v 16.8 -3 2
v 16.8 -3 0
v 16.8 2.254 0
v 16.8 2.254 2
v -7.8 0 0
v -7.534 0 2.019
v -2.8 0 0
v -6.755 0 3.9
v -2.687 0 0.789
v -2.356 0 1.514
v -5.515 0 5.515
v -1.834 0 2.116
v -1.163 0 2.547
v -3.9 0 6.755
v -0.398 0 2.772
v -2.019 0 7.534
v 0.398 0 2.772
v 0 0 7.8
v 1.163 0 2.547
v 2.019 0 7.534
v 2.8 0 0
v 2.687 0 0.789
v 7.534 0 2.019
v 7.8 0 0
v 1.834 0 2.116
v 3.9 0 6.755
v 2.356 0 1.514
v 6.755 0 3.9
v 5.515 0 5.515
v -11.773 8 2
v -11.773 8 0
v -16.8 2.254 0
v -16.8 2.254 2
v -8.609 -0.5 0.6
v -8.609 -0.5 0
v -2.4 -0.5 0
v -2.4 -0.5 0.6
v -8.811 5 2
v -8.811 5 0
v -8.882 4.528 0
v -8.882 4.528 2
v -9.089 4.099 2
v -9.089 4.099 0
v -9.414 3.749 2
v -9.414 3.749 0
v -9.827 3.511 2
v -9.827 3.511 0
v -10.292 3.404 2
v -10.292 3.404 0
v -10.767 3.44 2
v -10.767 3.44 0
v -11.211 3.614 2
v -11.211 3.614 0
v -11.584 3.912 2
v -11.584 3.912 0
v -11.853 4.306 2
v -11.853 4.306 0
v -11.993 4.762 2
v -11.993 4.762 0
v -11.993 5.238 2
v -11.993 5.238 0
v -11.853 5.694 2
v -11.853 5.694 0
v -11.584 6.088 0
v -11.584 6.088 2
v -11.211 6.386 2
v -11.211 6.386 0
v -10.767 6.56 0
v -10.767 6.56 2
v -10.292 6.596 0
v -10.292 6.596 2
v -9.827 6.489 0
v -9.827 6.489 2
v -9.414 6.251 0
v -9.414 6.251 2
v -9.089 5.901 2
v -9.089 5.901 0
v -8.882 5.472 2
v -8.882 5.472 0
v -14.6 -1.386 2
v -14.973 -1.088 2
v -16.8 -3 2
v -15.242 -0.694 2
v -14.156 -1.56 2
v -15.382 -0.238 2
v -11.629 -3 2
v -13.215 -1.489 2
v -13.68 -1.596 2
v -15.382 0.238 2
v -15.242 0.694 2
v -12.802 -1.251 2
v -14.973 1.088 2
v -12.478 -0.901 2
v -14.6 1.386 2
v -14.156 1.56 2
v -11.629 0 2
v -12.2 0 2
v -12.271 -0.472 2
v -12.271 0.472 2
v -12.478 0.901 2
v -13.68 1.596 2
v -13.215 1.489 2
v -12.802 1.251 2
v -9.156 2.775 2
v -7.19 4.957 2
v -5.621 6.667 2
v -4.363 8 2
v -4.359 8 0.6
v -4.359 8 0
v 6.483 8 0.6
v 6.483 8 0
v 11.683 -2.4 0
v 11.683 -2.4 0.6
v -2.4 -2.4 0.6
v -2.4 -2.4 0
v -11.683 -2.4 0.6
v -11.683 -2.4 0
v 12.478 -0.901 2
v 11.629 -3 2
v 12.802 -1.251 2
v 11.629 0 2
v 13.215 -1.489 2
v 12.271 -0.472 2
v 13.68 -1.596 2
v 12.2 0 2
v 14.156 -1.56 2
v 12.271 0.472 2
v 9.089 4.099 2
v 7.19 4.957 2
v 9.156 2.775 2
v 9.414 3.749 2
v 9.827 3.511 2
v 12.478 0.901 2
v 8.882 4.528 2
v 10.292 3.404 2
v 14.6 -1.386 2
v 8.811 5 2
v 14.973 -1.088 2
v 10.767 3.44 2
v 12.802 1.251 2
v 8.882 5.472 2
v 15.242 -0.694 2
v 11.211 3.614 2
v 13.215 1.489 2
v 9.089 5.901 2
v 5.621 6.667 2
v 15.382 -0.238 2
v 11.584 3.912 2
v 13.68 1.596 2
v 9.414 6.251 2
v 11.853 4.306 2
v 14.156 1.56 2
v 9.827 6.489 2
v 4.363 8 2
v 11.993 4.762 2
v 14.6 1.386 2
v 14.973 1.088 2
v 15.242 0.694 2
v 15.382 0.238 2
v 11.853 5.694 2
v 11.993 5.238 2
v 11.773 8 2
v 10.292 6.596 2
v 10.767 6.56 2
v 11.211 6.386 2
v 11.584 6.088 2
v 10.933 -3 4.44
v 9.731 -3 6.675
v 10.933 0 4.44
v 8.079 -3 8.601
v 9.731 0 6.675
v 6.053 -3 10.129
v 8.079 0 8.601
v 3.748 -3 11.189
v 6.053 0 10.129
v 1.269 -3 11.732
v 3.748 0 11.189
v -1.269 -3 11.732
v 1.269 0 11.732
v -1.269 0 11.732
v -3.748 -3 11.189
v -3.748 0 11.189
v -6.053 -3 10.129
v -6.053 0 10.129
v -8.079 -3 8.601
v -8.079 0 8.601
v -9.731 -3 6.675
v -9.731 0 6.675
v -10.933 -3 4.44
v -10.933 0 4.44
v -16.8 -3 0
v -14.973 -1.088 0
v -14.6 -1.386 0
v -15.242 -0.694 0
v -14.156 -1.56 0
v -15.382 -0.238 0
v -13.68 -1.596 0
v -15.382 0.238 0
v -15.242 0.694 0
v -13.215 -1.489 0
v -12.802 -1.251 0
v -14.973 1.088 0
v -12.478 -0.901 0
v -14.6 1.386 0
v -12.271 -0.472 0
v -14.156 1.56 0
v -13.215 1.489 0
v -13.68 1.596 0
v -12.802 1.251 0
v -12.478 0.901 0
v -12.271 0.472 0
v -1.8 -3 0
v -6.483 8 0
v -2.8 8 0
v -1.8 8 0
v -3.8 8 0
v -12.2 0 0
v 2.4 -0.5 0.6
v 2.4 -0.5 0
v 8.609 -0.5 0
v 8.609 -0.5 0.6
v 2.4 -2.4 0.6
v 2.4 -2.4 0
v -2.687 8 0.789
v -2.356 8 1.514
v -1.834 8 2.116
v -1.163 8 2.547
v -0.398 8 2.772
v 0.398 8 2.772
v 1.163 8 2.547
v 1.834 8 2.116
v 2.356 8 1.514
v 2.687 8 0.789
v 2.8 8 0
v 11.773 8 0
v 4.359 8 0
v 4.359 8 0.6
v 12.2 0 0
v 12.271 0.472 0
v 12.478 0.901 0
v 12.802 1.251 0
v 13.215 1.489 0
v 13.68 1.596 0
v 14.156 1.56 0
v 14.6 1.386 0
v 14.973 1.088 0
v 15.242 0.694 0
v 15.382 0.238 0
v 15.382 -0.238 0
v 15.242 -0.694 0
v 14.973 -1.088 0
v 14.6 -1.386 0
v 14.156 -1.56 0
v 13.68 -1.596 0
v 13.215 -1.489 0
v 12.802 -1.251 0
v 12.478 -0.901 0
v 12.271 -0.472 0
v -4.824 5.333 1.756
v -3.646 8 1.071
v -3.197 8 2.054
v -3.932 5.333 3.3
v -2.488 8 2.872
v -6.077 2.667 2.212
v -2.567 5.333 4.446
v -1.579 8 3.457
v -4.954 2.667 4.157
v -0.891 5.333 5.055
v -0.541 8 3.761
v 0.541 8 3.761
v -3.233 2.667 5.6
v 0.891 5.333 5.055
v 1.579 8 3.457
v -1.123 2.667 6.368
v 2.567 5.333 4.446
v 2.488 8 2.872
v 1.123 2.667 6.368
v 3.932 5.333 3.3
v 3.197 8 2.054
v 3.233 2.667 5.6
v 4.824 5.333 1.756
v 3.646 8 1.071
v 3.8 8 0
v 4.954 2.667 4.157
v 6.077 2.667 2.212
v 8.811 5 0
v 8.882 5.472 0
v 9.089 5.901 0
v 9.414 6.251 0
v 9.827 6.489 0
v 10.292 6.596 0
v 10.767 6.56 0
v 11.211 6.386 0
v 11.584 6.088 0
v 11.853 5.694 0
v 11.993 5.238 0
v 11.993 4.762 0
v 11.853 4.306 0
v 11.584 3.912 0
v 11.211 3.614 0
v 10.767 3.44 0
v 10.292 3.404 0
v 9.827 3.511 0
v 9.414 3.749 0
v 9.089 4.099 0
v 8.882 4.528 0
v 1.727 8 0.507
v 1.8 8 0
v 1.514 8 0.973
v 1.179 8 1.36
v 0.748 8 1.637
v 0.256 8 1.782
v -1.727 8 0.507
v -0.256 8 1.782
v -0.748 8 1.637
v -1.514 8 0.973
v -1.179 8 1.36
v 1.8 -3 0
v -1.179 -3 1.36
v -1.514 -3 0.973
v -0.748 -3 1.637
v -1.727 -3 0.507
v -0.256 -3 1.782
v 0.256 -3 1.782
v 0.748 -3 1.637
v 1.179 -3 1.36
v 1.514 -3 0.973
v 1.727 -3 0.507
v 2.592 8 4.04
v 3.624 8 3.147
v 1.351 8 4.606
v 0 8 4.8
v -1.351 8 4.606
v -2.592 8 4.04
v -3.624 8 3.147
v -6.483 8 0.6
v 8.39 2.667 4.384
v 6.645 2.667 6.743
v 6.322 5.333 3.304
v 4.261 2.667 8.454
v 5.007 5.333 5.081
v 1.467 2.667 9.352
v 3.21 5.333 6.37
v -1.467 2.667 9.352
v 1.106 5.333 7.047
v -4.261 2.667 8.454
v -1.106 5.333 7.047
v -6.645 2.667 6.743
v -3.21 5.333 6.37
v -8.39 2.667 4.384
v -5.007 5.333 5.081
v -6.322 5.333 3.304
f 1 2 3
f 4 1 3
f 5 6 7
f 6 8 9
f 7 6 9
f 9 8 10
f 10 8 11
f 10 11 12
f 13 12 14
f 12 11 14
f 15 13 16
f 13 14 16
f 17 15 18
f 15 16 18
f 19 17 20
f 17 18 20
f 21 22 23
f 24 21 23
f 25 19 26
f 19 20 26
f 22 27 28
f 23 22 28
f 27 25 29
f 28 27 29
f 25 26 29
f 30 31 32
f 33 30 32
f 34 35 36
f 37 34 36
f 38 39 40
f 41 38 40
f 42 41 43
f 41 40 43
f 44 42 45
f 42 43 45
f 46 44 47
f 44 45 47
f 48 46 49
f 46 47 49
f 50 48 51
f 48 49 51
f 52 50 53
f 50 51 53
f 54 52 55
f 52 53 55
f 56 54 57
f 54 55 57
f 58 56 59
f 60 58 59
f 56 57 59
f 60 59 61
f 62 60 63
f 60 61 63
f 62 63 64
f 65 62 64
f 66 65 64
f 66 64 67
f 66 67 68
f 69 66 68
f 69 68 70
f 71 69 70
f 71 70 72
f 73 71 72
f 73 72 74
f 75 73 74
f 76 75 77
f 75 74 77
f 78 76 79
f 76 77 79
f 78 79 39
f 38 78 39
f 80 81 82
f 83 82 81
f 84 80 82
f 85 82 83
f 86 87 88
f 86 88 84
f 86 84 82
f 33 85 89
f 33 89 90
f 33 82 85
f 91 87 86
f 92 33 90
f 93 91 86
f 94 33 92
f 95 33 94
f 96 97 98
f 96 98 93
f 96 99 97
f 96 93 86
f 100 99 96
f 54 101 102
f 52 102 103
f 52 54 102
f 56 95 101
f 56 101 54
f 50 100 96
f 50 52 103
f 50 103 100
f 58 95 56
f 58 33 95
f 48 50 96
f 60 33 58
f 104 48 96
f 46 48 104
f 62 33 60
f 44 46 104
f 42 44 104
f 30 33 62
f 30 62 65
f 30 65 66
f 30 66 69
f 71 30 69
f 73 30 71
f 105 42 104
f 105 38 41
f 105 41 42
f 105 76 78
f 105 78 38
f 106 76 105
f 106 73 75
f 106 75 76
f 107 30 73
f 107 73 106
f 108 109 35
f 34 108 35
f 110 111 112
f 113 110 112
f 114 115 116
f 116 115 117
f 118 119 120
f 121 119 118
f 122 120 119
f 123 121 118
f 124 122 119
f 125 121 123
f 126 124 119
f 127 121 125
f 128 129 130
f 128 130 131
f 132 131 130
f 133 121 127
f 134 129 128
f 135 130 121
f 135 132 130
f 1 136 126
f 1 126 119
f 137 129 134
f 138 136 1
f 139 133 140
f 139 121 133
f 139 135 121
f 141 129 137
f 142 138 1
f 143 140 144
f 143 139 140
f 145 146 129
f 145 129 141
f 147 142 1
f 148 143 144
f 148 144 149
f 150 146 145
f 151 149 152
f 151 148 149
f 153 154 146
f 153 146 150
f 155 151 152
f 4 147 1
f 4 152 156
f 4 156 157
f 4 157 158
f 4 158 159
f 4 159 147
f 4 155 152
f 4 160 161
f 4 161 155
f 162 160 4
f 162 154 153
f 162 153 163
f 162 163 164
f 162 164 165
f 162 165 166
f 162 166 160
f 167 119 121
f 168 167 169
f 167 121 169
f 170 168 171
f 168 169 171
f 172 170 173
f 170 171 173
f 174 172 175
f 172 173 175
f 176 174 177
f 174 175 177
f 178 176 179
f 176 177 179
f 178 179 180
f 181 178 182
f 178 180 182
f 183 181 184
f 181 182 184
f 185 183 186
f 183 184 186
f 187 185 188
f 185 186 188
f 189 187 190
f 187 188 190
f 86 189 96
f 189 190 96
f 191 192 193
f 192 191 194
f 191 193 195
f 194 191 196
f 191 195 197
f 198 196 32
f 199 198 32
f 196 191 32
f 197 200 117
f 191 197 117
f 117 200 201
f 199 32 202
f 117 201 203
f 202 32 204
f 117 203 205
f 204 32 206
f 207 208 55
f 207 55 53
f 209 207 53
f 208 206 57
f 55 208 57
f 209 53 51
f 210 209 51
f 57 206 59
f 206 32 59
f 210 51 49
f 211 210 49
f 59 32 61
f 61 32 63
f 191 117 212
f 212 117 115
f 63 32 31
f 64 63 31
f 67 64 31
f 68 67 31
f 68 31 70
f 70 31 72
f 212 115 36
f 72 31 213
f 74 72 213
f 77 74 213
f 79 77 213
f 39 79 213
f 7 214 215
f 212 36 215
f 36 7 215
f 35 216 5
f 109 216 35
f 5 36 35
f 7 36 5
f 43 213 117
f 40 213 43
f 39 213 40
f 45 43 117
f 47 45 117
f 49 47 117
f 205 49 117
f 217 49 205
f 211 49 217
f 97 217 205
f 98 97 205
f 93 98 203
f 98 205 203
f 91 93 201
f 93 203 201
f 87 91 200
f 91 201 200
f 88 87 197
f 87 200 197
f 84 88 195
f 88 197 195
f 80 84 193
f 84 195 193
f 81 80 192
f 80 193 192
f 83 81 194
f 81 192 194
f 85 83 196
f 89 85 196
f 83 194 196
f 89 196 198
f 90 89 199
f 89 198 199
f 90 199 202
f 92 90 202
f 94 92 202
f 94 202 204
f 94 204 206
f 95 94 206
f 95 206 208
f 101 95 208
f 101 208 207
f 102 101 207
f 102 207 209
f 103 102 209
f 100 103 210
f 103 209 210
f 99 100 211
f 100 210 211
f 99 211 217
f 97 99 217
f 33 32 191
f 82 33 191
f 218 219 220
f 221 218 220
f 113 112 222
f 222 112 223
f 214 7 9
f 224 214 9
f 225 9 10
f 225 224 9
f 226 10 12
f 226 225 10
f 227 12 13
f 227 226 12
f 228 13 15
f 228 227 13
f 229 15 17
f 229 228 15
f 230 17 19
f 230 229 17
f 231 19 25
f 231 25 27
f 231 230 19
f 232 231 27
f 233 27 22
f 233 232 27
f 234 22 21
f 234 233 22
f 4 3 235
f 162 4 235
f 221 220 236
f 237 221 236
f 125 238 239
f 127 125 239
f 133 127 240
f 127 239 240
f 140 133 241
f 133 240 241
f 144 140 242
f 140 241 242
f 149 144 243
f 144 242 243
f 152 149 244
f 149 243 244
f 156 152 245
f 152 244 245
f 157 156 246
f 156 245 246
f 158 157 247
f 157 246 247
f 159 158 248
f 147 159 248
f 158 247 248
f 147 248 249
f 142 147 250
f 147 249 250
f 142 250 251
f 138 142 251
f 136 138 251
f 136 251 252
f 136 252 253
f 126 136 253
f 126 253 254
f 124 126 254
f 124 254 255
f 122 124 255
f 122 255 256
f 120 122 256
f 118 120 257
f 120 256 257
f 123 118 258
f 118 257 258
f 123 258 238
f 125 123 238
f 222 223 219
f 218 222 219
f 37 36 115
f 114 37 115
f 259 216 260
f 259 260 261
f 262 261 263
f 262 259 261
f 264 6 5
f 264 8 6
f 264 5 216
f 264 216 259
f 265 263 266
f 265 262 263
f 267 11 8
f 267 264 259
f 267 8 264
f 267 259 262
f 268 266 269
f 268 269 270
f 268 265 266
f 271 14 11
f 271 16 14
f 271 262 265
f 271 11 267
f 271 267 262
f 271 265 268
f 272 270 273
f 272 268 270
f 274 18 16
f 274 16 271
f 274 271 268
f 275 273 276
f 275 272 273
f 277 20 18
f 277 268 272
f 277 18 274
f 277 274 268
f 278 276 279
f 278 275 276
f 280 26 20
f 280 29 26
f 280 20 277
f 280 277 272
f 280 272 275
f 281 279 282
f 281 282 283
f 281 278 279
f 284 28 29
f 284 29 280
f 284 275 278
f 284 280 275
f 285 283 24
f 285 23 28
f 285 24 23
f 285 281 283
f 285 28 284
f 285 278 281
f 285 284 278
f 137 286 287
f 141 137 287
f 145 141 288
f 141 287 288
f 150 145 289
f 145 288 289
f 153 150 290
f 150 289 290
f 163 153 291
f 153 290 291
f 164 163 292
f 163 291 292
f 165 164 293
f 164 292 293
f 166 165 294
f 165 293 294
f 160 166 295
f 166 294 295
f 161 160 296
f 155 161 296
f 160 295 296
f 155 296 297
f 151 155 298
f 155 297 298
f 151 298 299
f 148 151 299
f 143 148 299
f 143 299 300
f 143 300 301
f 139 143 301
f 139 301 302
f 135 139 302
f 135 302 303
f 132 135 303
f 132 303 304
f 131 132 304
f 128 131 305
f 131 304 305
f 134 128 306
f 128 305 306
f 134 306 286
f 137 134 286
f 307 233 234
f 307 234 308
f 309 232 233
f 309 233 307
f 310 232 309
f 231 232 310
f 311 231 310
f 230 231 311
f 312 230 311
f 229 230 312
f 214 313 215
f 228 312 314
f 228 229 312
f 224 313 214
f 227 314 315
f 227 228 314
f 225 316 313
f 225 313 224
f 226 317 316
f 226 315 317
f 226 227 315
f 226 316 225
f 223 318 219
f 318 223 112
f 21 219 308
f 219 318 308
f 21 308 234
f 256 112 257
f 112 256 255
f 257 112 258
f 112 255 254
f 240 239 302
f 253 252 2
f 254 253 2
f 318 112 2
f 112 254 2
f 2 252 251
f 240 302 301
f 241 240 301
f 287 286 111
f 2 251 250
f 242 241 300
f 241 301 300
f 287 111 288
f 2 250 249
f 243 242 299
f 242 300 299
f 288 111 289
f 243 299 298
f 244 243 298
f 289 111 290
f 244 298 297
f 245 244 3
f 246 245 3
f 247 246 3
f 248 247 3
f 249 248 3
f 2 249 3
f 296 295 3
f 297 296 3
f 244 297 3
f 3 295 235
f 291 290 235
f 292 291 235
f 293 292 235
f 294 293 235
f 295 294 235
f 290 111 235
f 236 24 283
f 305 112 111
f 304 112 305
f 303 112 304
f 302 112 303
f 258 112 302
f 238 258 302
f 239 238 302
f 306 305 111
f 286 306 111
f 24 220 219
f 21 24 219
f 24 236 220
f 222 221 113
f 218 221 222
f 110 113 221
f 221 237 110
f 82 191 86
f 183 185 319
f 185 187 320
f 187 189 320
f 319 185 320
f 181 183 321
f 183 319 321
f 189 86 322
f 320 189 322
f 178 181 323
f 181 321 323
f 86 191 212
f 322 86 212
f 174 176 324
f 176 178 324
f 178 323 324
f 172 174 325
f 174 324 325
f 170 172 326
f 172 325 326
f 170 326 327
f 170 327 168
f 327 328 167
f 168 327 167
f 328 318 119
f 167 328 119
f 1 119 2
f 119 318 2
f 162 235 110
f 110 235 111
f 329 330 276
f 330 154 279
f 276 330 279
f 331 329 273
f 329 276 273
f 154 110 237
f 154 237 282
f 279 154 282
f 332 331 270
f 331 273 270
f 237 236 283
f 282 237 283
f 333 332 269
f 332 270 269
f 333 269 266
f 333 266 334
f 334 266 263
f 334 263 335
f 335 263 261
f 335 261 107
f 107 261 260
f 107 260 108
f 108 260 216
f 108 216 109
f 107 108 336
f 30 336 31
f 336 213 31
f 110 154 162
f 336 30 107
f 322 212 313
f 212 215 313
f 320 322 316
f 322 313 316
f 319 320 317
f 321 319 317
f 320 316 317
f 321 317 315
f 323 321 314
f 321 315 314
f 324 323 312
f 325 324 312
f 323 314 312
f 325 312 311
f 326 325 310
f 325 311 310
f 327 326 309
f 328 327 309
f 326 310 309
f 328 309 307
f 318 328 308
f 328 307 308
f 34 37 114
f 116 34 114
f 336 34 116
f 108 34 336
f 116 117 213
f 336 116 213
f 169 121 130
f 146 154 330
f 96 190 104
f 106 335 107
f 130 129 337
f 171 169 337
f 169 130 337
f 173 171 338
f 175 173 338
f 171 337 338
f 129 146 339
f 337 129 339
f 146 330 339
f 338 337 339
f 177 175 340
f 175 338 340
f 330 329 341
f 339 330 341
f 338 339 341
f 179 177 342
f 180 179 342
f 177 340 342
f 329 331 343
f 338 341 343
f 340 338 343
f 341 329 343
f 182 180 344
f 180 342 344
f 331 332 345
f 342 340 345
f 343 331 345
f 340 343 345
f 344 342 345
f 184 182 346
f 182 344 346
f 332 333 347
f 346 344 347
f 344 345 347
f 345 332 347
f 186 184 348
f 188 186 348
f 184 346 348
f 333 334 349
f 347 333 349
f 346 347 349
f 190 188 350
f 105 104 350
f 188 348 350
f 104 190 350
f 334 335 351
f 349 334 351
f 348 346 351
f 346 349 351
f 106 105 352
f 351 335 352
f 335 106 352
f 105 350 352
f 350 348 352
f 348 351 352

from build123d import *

# Parameters (mm, degrees)
SKETCH1_W             = 1
SKETCH1_H             = 8
REVOLVE1_ANGLE        = 180
SKETCH2_R             = 1.6
BOSS_EXTRUDE1_DEPTH   = 2
BOSS_EXTRUDE1_2_DEPTH = 2
REVOLVE2_ANGLE        = 180
CUT_EXTRUDE1_DEPTH    = 0.6


with BuildPart() as part:
    # Sketch1 → Revolve1 (revolve)
    with BuildSketch(Plane.XY):
        Polygon((-1.8, -3), (-1.8, 0), (-2.8, 0), (-7.8, 0), (-10.8, 0), (-10.8, -3), align=None)
        Polygon((-10.8, 0), (-3.8, 8), (-7.8, 0), align=None)
        with Locations((-2.3, 4)):
            Rectangle(SKETCH1_W, SKETCH1_H)
    revolve(axis=Axis((0, 0, 0), (0, 1, 0)), revolution_arc=REVOLVE1_ANGLE)



with BuildPart() as body_2:
    # Sketch2 → Boss-Extrude1 (new body)
    with BuildSketch(Plane(origin=(0, 0, 0), x_dir=(-1, 0, 0), z_dir=(0, 0, -1))):
        Polygon((-10.8, -3), (-16.8, -3), (-16.8, 2.254410697), (-11.77260936, 8), (-3.8, 8), (-10.8, 0), align=None)
        with Locations((-10.41130468, 5)):
            Circle(SKETCH2_R, mode=Mode.SUBTRACT)
        with Locations((-13.8, 0)):
            Circle(SKETCH2_R, mode=Mode.SUBTRACT)
    extrude(amount=-BOSS_EXTRUDE1_DEPTH)


with BuildPart() as body_3:
    # Sketch2 → Boss-Extrude1 2 (new body)
    with BuildSketch(Plane(origin=(0, 0, 0), x_dir=(-1, 0, 0), z_dir=(0, 0, -1))):
        Polygon((10.8, 0), (3.8, 8), (11.77260936, 8), (16.8, 2.254410697), (16.8, -3), (10.8, -3), align=None)
        with Locations(Location((13.8, 0, 0), (0, 0, 180))):
            Circle(SKETCH2_R, mode=Mode.SUBTRACT)
        with Locations(Location((10.41130468, 5, 0), (0, 0, 180))):
            Circle(SKETCH2_R, mode=Mode.SUBTRACT)
    extrude(amount=-BOSS_EXTRUDE1_2_DEPTH)


with BuildPart() as part_1:
    add(part.part)

    add(body_2.part)  # Revolve2 merges body 2

    add(body_3.part)  # Revolve2 merges body 3
    # Sketch3 → Revolve2 (revolve)
    with BuildSketch(Plane(origin=(0, 0, 0), x_dir=(-1, 0, 0), z_dir=(0, 0, -1))):
        Polygon((-11.8, -3), (-11.8, 0), (-4.8, 8), (-3.8, 8), (-10.8, 0), (-10.8, -3), align=None)
    revolve(axis=Axis((0, 0, 0), (0, -1, 0)), revolution_arc=REVOLVE2_ANGLE)

    # Sketch4 → Cut-Extrude1 (cut)
    with BuildSketch(Plane(origin=(0, 0, 0), x_dir=(-1, 0, 0), z_dir=(0, 0, -1))):
        Polygon((-6.483281573, 8), (-11.683281573, -2.4), (-2.4, -2.4), (-2.4, -0.5), (-8.609016994, -0.5), (-4.359016994, 8), align=None)
        Polygon((2.4, -2.4), (11.683281573, -2.4), (6.383281573, 8.2), (4.259016994, 8.2), (8.609016994, -0.5), (2.4, -0.5), align=None)
    extrude(amount=-CUT_EXTRUDE1_DEPTH, mode=Mode.SUBTRACT)


solid = part_1.part
